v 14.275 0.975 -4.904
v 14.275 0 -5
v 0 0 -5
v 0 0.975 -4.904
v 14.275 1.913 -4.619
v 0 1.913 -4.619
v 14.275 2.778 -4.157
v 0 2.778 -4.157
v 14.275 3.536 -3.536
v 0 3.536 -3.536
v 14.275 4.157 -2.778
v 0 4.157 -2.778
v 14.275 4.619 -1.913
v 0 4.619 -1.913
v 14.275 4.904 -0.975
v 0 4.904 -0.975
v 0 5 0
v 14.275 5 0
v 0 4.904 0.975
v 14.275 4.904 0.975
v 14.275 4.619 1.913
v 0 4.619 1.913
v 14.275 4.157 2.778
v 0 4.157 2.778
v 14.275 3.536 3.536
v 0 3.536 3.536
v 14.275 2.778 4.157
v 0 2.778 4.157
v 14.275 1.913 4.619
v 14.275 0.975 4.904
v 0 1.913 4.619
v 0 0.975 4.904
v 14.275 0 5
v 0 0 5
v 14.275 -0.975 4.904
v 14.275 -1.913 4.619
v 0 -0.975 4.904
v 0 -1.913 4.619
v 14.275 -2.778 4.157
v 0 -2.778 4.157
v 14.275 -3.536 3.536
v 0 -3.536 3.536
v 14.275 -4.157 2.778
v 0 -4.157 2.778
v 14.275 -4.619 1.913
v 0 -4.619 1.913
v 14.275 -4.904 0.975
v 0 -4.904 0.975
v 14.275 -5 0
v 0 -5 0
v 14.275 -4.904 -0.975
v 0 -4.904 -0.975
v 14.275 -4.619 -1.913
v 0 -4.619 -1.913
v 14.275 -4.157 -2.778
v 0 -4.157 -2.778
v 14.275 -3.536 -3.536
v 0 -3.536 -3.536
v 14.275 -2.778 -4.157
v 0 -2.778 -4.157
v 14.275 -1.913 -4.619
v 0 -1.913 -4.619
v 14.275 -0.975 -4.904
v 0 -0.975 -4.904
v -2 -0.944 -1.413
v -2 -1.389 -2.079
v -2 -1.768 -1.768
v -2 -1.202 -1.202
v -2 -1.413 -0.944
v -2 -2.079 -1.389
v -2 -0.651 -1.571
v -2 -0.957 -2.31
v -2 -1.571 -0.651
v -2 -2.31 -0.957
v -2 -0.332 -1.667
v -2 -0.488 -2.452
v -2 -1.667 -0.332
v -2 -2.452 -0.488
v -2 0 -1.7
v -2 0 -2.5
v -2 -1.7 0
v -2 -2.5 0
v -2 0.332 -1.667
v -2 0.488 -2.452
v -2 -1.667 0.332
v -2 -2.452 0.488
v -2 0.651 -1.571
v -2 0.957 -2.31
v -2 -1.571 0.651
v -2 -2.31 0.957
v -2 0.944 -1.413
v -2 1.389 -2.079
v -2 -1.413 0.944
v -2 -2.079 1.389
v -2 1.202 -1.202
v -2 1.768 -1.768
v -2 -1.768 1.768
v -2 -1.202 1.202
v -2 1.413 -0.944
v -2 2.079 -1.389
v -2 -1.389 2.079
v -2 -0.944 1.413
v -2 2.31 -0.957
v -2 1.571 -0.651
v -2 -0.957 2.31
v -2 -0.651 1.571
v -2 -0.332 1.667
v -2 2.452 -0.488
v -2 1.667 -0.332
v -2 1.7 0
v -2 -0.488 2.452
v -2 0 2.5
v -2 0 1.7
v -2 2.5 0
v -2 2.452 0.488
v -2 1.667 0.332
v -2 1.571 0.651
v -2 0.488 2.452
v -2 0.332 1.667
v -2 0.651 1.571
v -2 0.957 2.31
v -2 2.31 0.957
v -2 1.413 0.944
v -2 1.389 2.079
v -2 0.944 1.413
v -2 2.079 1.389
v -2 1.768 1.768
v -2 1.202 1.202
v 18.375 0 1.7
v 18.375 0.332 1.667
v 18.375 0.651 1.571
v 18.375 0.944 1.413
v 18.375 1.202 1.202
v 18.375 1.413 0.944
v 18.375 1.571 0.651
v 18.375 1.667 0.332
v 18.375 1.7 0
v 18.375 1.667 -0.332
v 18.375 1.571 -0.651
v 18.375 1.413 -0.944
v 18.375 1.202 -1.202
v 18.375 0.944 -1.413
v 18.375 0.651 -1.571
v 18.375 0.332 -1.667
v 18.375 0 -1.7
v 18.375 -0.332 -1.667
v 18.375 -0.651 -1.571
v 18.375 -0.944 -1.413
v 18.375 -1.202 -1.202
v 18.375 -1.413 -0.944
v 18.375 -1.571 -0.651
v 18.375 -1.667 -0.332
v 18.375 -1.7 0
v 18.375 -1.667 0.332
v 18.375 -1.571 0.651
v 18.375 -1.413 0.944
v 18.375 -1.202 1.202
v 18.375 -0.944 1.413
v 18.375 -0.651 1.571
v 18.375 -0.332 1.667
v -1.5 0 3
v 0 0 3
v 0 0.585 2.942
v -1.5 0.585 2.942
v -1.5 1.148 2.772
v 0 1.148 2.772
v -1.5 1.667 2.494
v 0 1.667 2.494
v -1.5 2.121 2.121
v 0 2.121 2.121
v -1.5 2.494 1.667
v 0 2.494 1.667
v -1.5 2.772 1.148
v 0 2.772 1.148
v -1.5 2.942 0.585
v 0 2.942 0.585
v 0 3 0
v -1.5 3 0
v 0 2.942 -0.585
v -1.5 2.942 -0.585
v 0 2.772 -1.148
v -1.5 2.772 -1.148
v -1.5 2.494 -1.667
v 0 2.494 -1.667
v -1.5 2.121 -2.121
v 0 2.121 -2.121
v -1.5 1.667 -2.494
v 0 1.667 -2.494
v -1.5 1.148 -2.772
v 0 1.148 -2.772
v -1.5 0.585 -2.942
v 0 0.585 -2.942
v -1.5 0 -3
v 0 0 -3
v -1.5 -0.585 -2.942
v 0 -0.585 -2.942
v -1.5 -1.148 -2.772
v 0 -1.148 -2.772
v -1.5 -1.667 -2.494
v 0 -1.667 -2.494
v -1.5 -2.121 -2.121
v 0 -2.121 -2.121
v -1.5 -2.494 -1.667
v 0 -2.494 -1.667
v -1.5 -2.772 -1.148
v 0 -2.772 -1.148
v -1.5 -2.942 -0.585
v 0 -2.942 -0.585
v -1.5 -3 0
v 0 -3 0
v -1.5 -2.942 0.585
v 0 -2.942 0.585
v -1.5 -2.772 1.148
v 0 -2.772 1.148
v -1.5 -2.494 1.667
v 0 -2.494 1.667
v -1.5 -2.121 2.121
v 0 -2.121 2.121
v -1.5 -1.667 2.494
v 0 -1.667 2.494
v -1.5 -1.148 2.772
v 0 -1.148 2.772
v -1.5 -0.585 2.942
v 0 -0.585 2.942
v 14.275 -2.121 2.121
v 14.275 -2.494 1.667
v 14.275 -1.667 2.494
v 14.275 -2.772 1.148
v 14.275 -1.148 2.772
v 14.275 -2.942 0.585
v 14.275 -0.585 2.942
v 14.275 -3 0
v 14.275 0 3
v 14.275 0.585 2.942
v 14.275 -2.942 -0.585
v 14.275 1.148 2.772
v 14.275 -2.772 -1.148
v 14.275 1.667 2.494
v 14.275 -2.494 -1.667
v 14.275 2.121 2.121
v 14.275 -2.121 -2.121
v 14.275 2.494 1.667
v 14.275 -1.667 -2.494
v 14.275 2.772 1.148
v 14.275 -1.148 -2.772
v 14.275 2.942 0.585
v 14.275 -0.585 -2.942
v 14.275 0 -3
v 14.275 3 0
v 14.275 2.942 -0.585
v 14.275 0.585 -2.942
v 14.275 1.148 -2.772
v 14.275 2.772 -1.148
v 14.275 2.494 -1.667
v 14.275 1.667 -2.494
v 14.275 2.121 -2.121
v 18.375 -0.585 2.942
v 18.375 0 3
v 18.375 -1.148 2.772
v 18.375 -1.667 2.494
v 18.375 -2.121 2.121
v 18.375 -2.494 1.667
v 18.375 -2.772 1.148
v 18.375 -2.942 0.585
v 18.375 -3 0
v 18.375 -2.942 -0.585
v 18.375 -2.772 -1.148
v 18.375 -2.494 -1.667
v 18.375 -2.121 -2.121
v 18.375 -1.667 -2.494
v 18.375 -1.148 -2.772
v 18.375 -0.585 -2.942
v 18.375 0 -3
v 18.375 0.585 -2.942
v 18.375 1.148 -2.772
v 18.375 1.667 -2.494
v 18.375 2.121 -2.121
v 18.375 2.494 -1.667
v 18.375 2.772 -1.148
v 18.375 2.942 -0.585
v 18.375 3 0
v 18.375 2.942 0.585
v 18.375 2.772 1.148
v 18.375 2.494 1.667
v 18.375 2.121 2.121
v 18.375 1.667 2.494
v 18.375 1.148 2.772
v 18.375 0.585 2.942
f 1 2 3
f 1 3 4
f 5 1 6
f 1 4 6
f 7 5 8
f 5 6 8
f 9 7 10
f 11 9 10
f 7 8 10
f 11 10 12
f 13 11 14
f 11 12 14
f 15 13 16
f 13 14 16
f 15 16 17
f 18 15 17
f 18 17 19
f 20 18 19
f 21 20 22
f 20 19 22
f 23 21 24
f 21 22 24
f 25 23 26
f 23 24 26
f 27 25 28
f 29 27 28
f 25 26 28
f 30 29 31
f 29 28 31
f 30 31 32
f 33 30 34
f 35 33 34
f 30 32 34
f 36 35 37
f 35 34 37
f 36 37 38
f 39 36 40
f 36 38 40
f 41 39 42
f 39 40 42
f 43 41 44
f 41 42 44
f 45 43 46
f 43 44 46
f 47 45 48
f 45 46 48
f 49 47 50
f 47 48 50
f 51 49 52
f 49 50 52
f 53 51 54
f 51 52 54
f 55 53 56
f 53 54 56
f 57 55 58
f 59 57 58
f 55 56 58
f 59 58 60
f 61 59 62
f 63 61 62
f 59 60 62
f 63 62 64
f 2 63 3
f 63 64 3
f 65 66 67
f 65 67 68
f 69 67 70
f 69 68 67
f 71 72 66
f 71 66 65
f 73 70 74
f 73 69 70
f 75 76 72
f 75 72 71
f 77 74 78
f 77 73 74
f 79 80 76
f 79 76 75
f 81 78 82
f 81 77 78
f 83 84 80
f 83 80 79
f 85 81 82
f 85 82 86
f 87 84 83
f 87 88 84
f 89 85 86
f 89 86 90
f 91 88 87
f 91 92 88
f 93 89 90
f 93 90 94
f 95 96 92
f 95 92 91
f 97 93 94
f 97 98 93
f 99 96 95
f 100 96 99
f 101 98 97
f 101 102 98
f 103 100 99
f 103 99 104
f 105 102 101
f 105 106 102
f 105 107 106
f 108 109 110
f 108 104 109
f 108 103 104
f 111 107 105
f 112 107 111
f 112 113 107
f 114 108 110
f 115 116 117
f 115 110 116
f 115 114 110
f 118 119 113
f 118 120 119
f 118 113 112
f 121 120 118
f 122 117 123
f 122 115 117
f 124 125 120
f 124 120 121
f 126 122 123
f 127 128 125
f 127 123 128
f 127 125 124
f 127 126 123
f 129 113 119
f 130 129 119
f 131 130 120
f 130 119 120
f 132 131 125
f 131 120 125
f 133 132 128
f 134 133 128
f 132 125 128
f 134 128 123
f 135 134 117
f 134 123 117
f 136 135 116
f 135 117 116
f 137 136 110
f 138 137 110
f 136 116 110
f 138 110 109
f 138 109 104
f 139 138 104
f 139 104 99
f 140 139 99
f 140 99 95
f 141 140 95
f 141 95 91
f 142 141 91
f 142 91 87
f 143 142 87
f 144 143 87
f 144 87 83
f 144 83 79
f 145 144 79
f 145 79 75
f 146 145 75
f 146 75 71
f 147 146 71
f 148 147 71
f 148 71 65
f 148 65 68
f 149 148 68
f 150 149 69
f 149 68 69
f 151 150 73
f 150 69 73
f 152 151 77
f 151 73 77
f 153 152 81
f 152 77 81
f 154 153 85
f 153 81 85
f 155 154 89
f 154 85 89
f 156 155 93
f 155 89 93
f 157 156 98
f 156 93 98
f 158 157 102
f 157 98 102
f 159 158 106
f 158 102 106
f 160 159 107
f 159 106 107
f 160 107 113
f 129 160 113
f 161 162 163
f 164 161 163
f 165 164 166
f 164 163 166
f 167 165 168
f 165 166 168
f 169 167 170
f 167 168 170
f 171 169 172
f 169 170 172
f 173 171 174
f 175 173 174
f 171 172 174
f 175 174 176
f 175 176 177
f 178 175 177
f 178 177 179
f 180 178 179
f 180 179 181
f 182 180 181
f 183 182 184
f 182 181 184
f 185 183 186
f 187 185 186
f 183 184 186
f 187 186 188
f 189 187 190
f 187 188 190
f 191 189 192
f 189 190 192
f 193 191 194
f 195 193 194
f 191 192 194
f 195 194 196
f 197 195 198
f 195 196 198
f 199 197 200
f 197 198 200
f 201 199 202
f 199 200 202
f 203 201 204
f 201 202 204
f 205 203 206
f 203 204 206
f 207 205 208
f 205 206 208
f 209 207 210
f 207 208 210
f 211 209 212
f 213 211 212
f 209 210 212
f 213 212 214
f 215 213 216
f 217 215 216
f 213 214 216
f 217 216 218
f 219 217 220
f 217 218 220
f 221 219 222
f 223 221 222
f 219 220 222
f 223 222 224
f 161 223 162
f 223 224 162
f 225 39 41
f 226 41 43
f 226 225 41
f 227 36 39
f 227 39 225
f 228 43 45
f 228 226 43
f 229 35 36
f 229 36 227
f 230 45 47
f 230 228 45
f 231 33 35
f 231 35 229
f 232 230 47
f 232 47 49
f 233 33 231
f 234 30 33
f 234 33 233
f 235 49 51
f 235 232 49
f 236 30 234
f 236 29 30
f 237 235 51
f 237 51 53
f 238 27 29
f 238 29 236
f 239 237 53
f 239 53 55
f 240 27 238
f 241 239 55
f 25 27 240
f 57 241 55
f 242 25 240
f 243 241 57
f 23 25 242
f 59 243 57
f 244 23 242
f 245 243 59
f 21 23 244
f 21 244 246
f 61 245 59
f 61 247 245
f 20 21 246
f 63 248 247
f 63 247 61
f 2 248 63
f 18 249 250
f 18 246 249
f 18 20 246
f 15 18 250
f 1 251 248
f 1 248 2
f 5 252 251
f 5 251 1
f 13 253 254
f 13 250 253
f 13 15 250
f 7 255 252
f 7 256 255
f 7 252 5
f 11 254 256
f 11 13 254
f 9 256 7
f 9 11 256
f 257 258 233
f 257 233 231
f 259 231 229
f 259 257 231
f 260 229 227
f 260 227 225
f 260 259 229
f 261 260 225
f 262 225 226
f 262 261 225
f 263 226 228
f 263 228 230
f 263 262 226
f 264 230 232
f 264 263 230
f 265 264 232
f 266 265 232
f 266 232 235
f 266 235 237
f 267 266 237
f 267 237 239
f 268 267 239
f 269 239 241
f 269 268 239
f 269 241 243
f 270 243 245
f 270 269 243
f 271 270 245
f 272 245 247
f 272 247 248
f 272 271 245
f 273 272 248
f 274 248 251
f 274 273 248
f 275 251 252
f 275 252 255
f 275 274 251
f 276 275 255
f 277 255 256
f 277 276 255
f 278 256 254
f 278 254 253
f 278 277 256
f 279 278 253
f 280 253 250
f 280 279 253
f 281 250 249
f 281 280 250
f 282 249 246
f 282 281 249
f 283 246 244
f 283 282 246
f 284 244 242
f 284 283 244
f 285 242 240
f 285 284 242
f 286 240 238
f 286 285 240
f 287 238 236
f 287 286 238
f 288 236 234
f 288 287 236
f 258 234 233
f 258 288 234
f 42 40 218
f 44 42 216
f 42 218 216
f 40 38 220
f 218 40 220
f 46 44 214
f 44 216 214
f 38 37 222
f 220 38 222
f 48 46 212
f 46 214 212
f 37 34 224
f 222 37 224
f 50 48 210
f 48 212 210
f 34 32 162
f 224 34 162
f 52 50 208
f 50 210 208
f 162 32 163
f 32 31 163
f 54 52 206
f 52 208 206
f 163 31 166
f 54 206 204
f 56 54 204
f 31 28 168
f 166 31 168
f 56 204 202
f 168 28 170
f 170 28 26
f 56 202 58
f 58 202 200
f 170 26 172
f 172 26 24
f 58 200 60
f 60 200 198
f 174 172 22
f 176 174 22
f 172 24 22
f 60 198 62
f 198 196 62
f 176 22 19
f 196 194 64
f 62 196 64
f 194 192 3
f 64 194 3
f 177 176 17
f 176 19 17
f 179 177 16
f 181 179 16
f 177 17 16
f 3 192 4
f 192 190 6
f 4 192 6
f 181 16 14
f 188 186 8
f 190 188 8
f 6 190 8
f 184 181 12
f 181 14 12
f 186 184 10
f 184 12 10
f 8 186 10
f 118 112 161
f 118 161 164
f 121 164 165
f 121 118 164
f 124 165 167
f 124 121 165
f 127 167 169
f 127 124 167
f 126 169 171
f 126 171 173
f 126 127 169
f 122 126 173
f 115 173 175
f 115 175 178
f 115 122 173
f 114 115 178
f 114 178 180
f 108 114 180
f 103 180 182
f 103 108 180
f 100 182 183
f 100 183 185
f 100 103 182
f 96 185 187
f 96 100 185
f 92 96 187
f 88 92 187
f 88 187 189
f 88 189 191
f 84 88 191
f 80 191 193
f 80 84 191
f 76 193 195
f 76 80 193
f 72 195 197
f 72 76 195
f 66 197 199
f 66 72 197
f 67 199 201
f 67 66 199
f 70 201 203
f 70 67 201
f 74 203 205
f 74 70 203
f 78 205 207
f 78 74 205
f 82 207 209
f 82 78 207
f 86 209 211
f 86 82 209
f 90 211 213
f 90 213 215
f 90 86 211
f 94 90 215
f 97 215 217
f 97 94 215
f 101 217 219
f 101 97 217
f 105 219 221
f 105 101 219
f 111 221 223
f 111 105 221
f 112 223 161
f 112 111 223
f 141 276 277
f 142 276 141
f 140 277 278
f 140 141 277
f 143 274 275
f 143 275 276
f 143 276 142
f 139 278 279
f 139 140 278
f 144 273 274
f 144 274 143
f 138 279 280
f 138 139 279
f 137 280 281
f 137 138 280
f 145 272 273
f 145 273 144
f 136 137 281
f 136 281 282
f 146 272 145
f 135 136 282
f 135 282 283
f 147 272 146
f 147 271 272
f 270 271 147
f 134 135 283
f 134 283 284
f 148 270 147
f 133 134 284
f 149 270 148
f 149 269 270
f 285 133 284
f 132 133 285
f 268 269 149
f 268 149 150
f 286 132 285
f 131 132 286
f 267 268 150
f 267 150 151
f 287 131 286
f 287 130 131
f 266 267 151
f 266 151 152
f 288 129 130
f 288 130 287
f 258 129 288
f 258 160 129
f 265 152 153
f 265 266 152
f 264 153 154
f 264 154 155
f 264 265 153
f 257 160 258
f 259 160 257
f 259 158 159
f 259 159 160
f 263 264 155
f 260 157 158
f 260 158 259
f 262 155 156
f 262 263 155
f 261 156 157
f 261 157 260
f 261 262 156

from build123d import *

# Parameters (mm, degrees)
ESQUISSE1_R        = 5
BOSS_EXTRU_1_DEPTH = 14.275
ESQUISSE5_R        = 3
BOSS_EXTRU_2_DEPTH = 2
CHANFREIN1_SIZE    = 0.5
BOSS_EXTRU_3_START = 4.1
ESQUISSE6_R        = 3
BOSS_EXTRU_3_DEPTH = 4.1
D_GAGEMENT_M32_D   = 3.4


with BuildPart() as part:
    # Esquisse1 → Boss.-Extru.1 (new body)
    with BuildSketch(Plane(origin=(0, 0, 0), x_dir=(0, 0, -1), z_dir=(1, 0, 0))):
        Circle(ESQUISSE1_R)
    extrude(amount=BOSS_EXTRU_1_DEPTH)

    # Esquisse5 → Boss.-Extru.2 (add)
    with BuildSketch(Plane.ZY):
        Circle(ESQUISSE5_R)
    extrude(amount=BOSS_EXTRU_2_DEPTH)

    # Chanfrein1
    chanfrein1_edges = [part.edges().sort_by_distance(p)[0] for p in [
        (-2, 0, -3),
    ]]
    chamfer(chanfrein1_edges, length=CHANFREIN1_SIZE)

    # Esquisse6 → Boss.-Extru.3 (add)
    with BuildSketch(Plane(origin=(14.275, 0, 0), x_dir=(0, 0, -1), z_dir=(1, 0, 0)).offset(BOSS_EXTRU_3_START)):
        with Locations(Location((0, 0, 0), (0, 0, 180))):
            Circle(ESQUISSE6_R)
    extrude(amount=-BOSS_EXTRU_3_DEPTH)

    # Dégagement M32 (through all)
    with Locations(Plane(origin=(18.375, 0, 0), x_dir=(0, 0, -1), z_dir=(1, 0, 0))):
        with Locations((0, 0)):
            Hole(D_GAGEMENT_M32_D / 2)


solid = part.part
